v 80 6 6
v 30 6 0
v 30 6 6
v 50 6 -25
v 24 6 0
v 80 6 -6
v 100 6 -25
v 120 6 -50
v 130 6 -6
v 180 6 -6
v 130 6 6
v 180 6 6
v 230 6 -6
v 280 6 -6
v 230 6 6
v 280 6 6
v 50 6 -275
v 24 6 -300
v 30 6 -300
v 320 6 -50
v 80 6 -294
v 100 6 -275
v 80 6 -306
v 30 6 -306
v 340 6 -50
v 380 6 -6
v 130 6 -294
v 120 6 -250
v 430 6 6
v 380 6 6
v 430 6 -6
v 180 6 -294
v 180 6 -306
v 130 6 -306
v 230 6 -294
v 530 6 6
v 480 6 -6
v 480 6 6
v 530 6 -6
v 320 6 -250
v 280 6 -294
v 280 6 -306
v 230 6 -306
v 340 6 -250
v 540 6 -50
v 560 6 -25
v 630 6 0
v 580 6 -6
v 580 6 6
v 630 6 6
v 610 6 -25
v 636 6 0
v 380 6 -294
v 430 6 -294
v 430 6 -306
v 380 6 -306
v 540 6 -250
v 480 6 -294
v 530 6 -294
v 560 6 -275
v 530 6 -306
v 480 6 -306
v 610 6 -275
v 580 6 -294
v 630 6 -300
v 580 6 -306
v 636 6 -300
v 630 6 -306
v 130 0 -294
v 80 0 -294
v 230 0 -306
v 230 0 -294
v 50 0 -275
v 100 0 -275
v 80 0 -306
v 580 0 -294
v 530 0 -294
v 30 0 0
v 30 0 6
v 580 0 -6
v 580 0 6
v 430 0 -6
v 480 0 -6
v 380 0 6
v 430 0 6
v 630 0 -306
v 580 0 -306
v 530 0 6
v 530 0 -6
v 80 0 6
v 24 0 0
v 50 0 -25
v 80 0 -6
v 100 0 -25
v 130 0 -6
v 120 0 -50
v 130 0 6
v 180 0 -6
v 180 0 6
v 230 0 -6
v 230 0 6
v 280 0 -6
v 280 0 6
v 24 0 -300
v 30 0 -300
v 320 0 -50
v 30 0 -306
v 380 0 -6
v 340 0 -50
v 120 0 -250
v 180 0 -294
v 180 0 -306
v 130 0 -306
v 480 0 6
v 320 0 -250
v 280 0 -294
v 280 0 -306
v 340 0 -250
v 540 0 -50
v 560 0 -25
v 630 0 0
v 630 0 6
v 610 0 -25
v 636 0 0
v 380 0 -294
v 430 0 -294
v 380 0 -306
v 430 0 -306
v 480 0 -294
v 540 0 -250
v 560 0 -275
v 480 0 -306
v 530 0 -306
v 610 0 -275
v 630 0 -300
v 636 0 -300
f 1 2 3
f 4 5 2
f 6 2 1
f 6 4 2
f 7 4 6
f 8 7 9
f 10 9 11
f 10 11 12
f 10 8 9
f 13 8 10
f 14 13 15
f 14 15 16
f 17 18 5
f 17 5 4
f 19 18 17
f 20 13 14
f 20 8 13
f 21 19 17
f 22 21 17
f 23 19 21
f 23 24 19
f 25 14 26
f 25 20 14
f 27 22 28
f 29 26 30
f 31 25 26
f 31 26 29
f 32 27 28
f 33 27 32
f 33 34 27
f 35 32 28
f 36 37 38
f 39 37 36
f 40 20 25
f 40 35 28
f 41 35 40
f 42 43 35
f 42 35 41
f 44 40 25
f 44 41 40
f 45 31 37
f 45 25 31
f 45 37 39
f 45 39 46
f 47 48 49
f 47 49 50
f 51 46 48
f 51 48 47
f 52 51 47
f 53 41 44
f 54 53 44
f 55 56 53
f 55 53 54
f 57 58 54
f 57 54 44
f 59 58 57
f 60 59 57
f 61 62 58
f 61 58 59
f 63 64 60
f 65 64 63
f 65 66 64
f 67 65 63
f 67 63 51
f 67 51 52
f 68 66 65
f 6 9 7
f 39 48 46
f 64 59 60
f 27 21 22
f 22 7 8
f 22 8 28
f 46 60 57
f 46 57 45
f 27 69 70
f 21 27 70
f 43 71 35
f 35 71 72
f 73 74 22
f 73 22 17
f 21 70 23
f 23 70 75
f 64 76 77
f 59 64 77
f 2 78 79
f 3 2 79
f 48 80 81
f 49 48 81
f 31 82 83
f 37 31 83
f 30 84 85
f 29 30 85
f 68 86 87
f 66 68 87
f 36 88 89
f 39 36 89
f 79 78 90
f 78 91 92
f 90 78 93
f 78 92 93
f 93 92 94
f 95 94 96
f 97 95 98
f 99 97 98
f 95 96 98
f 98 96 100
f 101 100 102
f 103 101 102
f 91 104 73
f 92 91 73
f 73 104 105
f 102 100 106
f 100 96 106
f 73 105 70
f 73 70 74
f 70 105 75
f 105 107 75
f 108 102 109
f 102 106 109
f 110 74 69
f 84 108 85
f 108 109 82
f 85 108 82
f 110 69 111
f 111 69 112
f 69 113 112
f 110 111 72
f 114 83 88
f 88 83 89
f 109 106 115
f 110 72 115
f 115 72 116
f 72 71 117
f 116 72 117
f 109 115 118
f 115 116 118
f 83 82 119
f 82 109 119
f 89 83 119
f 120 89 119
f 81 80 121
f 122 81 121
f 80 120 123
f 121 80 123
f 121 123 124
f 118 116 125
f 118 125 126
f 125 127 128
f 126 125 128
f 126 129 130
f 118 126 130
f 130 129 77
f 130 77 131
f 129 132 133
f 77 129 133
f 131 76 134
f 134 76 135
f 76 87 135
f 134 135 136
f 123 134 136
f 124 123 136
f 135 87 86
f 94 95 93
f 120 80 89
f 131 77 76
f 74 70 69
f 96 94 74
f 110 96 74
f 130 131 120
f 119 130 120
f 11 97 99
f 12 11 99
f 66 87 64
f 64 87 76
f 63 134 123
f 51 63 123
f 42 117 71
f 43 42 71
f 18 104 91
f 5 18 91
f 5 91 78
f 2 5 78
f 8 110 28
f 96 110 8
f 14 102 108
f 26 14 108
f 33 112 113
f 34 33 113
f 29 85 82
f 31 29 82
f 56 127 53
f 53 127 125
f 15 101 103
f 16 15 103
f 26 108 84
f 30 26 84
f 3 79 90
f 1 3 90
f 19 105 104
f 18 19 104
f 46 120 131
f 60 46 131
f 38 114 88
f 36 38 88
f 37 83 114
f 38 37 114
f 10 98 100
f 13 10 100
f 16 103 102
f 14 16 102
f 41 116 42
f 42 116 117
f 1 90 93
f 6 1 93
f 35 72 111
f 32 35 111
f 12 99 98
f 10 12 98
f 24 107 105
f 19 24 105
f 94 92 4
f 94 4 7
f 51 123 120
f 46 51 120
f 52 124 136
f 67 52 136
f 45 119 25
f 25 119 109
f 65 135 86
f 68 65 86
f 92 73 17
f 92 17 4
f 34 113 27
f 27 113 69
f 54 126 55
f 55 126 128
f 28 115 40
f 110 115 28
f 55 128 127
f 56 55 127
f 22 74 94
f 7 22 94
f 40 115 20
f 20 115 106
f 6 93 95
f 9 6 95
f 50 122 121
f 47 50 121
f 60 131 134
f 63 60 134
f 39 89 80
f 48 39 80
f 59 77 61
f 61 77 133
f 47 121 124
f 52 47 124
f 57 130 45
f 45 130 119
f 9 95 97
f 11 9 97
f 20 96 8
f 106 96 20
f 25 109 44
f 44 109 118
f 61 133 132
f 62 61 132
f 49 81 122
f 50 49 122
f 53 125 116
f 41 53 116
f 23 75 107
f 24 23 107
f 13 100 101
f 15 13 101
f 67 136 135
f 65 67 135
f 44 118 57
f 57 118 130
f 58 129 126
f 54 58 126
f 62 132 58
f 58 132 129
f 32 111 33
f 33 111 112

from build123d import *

# Parameters (mm, degrees)
EXTRUDE_1_DEPTH = 6


with BuildPart() as part:
    # 草图1 → 凸台-拉伸1 (new body)
    with BuildSketch(Plane(origin=(0, 0, 0), x_dir=(1, 0, 0), z_dir=(0, 1, 0))):
        Polygon((30, 300), (24, 300), (24, 0), (30, 0), (30, -6), (80, -6), (80, 6), (130, 6), (130, -6), (180, -6), (180, 6), (230, 6), (230, -6), (280, -6), (280, 6), (380, 6), (380, -6), (430, -6), (430, 6), (480, 6), (480, -6), (530, -6), (530, 6), (580, 6), (580, -6), (630, -6), (630, 0), (636, 0), (636, 300), (630, 300), (630, 306), (580, 306), (580, 294), (530, 294), (530, 306), (480, 306), (480, 294), (430, 294), (430, 306), (380, 306), (380, 294), (280, 294), (280, 306), (230, 306), (230, 294), (180, 294), (180, 306), (130, 306), (130, 294), (80, 294), (80, 306), (30, 306), align=None)
        Polygon((340, 150), (340, 250), (540, 250), (540, 50), (340, 50), align=None, mode=Mode.SUBTRACT)
        Polygon((560, 150), (560, 275), (610, 275), (610, 25), (560, 25), align=None, mode=Mode.SUBTRACT)
        Polygon((100, 25), (100, 150), (100, 275), (50, 275), (50, 25), align=None, mode=Mode.SUBTRACT)
        Polygon((320, 50), (320, 150), (320, 250), (120, 250), (120, 50), align=None, mode=Mode.SUBTRACT)
    extrude(amount=EXTRUDE_1_DEPTH)


solid = part.part
